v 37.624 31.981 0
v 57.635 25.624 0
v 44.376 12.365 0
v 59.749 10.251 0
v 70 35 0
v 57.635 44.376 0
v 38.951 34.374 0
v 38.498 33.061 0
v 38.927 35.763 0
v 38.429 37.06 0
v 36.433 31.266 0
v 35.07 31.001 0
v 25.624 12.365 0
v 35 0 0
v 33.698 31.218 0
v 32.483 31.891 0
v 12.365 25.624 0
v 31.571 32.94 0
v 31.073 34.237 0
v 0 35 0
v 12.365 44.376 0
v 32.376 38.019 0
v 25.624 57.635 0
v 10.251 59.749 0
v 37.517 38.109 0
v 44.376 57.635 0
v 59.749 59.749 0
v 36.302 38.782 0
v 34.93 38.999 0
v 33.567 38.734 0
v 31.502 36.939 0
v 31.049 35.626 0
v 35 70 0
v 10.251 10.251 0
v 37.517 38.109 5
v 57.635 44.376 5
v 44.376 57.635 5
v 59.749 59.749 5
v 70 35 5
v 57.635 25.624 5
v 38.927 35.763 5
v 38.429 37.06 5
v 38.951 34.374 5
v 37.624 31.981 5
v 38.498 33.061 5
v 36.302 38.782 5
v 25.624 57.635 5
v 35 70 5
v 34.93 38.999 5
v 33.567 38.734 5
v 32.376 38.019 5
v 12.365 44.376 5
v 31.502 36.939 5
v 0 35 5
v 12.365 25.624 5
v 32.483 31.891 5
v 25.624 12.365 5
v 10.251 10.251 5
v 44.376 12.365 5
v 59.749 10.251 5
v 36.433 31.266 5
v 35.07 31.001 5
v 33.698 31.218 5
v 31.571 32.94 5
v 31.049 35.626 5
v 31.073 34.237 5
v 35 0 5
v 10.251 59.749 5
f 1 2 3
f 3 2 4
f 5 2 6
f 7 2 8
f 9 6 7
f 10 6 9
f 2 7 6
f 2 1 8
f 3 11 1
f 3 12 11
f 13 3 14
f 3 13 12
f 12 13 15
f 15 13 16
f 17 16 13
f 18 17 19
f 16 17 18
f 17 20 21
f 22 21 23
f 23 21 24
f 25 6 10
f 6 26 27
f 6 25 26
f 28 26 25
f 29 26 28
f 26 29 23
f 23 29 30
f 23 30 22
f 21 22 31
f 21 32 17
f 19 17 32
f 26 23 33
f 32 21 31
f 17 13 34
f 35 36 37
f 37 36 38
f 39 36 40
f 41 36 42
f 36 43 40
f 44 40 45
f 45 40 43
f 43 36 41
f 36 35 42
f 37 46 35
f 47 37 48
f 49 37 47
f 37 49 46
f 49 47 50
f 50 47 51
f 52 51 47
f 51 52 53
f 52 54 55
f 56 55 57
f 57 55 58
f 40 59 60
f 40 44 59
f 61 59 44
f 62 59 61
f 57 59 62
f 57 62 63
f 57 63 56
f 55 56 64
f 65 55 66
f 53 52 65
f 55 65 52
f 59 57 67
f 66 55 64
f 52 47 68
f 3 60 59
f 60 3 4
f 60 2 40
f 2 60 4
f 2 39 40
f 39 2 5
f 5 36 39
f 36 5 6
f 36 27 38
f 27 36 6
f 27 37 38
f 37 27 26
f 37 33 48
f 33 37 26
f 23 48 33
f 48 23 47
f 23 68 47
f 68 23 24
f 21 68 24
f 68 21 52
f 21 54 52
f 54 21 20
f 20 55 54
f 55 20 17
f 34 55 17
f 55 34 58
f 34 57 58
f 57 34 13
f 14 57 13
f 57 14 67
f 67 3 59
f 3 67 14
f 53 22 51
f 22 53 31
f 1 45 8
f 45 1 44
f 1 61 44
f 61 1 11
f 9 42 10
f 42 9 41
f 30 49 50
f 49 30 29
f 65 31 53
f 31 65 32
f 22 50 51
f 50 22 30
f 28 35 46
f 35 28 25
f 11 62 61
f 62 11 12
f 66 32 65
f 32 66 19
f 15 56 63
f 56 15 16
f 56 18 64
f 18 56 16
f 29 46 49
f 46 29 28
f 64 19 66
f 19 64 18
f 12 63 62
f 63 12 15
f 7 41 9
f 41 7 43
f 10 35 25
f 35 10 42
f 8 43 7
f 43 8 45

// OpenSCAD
$fn = 32;

// ----------------------------------------------------------------------
// Star wheel: 8-point blunt, R35
// ----------------------------------------------------------------------

// --- parameters (mm) ---
n_points = 8;             // number of points / teeth
r_out = 35;               // tip radius
r_in = 24.5;              // root radius
bore_r = 4;               // centre bore radius
plate_t = 5;              // plate thickness, Z (extrusion height)
bore_d = 8;               // centre bore diameter
fit_tol = 0.02;           // declared fit tolerance (prompt contract)
free_tol = 0.2;           // declared free tolerance (prompt contract)

profile = [[35, 70], [25.624, 57.635], [10.251, 59.749], [12.365, 44.376], [0, 35], [12.365, 25.624], [10.251, 10.251], [25.624, 12.365], [35, 0], [44.376, 12.365], [59.749, 10.251], [57.635, 25.624], [70, 35], [57.635, 44.376], [59.749, 59.749], [44.376, 57.635]];  // primary outline, 16 points, counter clockwise
void_1 = [[38.927, 35.763], [38.429, 37.06], [37.517, 38.109], [36.302, 38.782], [34.93, 38.999], [33.567, 38.734], [32.376, 38.019], [31.502, 36.939], [31.049, 35.626], [31.073, 34.237], [31.571, 32.94], [32.483, 31.891], [33.698, 31.218], [35.07, 31.001], [36.433, 31.266], [37.624, 31.981], [38.498, 33.061], [38.951, 34.374]];  // centre bore, 18 points

// --- the one profile operation ---
difference() {
  linear_extrude(height = plate_t) polygon(points = profile);
  translate([0, 0, -1])
    linear_extrude(height = plate_t + 2) polygon(points = void_1);
}
